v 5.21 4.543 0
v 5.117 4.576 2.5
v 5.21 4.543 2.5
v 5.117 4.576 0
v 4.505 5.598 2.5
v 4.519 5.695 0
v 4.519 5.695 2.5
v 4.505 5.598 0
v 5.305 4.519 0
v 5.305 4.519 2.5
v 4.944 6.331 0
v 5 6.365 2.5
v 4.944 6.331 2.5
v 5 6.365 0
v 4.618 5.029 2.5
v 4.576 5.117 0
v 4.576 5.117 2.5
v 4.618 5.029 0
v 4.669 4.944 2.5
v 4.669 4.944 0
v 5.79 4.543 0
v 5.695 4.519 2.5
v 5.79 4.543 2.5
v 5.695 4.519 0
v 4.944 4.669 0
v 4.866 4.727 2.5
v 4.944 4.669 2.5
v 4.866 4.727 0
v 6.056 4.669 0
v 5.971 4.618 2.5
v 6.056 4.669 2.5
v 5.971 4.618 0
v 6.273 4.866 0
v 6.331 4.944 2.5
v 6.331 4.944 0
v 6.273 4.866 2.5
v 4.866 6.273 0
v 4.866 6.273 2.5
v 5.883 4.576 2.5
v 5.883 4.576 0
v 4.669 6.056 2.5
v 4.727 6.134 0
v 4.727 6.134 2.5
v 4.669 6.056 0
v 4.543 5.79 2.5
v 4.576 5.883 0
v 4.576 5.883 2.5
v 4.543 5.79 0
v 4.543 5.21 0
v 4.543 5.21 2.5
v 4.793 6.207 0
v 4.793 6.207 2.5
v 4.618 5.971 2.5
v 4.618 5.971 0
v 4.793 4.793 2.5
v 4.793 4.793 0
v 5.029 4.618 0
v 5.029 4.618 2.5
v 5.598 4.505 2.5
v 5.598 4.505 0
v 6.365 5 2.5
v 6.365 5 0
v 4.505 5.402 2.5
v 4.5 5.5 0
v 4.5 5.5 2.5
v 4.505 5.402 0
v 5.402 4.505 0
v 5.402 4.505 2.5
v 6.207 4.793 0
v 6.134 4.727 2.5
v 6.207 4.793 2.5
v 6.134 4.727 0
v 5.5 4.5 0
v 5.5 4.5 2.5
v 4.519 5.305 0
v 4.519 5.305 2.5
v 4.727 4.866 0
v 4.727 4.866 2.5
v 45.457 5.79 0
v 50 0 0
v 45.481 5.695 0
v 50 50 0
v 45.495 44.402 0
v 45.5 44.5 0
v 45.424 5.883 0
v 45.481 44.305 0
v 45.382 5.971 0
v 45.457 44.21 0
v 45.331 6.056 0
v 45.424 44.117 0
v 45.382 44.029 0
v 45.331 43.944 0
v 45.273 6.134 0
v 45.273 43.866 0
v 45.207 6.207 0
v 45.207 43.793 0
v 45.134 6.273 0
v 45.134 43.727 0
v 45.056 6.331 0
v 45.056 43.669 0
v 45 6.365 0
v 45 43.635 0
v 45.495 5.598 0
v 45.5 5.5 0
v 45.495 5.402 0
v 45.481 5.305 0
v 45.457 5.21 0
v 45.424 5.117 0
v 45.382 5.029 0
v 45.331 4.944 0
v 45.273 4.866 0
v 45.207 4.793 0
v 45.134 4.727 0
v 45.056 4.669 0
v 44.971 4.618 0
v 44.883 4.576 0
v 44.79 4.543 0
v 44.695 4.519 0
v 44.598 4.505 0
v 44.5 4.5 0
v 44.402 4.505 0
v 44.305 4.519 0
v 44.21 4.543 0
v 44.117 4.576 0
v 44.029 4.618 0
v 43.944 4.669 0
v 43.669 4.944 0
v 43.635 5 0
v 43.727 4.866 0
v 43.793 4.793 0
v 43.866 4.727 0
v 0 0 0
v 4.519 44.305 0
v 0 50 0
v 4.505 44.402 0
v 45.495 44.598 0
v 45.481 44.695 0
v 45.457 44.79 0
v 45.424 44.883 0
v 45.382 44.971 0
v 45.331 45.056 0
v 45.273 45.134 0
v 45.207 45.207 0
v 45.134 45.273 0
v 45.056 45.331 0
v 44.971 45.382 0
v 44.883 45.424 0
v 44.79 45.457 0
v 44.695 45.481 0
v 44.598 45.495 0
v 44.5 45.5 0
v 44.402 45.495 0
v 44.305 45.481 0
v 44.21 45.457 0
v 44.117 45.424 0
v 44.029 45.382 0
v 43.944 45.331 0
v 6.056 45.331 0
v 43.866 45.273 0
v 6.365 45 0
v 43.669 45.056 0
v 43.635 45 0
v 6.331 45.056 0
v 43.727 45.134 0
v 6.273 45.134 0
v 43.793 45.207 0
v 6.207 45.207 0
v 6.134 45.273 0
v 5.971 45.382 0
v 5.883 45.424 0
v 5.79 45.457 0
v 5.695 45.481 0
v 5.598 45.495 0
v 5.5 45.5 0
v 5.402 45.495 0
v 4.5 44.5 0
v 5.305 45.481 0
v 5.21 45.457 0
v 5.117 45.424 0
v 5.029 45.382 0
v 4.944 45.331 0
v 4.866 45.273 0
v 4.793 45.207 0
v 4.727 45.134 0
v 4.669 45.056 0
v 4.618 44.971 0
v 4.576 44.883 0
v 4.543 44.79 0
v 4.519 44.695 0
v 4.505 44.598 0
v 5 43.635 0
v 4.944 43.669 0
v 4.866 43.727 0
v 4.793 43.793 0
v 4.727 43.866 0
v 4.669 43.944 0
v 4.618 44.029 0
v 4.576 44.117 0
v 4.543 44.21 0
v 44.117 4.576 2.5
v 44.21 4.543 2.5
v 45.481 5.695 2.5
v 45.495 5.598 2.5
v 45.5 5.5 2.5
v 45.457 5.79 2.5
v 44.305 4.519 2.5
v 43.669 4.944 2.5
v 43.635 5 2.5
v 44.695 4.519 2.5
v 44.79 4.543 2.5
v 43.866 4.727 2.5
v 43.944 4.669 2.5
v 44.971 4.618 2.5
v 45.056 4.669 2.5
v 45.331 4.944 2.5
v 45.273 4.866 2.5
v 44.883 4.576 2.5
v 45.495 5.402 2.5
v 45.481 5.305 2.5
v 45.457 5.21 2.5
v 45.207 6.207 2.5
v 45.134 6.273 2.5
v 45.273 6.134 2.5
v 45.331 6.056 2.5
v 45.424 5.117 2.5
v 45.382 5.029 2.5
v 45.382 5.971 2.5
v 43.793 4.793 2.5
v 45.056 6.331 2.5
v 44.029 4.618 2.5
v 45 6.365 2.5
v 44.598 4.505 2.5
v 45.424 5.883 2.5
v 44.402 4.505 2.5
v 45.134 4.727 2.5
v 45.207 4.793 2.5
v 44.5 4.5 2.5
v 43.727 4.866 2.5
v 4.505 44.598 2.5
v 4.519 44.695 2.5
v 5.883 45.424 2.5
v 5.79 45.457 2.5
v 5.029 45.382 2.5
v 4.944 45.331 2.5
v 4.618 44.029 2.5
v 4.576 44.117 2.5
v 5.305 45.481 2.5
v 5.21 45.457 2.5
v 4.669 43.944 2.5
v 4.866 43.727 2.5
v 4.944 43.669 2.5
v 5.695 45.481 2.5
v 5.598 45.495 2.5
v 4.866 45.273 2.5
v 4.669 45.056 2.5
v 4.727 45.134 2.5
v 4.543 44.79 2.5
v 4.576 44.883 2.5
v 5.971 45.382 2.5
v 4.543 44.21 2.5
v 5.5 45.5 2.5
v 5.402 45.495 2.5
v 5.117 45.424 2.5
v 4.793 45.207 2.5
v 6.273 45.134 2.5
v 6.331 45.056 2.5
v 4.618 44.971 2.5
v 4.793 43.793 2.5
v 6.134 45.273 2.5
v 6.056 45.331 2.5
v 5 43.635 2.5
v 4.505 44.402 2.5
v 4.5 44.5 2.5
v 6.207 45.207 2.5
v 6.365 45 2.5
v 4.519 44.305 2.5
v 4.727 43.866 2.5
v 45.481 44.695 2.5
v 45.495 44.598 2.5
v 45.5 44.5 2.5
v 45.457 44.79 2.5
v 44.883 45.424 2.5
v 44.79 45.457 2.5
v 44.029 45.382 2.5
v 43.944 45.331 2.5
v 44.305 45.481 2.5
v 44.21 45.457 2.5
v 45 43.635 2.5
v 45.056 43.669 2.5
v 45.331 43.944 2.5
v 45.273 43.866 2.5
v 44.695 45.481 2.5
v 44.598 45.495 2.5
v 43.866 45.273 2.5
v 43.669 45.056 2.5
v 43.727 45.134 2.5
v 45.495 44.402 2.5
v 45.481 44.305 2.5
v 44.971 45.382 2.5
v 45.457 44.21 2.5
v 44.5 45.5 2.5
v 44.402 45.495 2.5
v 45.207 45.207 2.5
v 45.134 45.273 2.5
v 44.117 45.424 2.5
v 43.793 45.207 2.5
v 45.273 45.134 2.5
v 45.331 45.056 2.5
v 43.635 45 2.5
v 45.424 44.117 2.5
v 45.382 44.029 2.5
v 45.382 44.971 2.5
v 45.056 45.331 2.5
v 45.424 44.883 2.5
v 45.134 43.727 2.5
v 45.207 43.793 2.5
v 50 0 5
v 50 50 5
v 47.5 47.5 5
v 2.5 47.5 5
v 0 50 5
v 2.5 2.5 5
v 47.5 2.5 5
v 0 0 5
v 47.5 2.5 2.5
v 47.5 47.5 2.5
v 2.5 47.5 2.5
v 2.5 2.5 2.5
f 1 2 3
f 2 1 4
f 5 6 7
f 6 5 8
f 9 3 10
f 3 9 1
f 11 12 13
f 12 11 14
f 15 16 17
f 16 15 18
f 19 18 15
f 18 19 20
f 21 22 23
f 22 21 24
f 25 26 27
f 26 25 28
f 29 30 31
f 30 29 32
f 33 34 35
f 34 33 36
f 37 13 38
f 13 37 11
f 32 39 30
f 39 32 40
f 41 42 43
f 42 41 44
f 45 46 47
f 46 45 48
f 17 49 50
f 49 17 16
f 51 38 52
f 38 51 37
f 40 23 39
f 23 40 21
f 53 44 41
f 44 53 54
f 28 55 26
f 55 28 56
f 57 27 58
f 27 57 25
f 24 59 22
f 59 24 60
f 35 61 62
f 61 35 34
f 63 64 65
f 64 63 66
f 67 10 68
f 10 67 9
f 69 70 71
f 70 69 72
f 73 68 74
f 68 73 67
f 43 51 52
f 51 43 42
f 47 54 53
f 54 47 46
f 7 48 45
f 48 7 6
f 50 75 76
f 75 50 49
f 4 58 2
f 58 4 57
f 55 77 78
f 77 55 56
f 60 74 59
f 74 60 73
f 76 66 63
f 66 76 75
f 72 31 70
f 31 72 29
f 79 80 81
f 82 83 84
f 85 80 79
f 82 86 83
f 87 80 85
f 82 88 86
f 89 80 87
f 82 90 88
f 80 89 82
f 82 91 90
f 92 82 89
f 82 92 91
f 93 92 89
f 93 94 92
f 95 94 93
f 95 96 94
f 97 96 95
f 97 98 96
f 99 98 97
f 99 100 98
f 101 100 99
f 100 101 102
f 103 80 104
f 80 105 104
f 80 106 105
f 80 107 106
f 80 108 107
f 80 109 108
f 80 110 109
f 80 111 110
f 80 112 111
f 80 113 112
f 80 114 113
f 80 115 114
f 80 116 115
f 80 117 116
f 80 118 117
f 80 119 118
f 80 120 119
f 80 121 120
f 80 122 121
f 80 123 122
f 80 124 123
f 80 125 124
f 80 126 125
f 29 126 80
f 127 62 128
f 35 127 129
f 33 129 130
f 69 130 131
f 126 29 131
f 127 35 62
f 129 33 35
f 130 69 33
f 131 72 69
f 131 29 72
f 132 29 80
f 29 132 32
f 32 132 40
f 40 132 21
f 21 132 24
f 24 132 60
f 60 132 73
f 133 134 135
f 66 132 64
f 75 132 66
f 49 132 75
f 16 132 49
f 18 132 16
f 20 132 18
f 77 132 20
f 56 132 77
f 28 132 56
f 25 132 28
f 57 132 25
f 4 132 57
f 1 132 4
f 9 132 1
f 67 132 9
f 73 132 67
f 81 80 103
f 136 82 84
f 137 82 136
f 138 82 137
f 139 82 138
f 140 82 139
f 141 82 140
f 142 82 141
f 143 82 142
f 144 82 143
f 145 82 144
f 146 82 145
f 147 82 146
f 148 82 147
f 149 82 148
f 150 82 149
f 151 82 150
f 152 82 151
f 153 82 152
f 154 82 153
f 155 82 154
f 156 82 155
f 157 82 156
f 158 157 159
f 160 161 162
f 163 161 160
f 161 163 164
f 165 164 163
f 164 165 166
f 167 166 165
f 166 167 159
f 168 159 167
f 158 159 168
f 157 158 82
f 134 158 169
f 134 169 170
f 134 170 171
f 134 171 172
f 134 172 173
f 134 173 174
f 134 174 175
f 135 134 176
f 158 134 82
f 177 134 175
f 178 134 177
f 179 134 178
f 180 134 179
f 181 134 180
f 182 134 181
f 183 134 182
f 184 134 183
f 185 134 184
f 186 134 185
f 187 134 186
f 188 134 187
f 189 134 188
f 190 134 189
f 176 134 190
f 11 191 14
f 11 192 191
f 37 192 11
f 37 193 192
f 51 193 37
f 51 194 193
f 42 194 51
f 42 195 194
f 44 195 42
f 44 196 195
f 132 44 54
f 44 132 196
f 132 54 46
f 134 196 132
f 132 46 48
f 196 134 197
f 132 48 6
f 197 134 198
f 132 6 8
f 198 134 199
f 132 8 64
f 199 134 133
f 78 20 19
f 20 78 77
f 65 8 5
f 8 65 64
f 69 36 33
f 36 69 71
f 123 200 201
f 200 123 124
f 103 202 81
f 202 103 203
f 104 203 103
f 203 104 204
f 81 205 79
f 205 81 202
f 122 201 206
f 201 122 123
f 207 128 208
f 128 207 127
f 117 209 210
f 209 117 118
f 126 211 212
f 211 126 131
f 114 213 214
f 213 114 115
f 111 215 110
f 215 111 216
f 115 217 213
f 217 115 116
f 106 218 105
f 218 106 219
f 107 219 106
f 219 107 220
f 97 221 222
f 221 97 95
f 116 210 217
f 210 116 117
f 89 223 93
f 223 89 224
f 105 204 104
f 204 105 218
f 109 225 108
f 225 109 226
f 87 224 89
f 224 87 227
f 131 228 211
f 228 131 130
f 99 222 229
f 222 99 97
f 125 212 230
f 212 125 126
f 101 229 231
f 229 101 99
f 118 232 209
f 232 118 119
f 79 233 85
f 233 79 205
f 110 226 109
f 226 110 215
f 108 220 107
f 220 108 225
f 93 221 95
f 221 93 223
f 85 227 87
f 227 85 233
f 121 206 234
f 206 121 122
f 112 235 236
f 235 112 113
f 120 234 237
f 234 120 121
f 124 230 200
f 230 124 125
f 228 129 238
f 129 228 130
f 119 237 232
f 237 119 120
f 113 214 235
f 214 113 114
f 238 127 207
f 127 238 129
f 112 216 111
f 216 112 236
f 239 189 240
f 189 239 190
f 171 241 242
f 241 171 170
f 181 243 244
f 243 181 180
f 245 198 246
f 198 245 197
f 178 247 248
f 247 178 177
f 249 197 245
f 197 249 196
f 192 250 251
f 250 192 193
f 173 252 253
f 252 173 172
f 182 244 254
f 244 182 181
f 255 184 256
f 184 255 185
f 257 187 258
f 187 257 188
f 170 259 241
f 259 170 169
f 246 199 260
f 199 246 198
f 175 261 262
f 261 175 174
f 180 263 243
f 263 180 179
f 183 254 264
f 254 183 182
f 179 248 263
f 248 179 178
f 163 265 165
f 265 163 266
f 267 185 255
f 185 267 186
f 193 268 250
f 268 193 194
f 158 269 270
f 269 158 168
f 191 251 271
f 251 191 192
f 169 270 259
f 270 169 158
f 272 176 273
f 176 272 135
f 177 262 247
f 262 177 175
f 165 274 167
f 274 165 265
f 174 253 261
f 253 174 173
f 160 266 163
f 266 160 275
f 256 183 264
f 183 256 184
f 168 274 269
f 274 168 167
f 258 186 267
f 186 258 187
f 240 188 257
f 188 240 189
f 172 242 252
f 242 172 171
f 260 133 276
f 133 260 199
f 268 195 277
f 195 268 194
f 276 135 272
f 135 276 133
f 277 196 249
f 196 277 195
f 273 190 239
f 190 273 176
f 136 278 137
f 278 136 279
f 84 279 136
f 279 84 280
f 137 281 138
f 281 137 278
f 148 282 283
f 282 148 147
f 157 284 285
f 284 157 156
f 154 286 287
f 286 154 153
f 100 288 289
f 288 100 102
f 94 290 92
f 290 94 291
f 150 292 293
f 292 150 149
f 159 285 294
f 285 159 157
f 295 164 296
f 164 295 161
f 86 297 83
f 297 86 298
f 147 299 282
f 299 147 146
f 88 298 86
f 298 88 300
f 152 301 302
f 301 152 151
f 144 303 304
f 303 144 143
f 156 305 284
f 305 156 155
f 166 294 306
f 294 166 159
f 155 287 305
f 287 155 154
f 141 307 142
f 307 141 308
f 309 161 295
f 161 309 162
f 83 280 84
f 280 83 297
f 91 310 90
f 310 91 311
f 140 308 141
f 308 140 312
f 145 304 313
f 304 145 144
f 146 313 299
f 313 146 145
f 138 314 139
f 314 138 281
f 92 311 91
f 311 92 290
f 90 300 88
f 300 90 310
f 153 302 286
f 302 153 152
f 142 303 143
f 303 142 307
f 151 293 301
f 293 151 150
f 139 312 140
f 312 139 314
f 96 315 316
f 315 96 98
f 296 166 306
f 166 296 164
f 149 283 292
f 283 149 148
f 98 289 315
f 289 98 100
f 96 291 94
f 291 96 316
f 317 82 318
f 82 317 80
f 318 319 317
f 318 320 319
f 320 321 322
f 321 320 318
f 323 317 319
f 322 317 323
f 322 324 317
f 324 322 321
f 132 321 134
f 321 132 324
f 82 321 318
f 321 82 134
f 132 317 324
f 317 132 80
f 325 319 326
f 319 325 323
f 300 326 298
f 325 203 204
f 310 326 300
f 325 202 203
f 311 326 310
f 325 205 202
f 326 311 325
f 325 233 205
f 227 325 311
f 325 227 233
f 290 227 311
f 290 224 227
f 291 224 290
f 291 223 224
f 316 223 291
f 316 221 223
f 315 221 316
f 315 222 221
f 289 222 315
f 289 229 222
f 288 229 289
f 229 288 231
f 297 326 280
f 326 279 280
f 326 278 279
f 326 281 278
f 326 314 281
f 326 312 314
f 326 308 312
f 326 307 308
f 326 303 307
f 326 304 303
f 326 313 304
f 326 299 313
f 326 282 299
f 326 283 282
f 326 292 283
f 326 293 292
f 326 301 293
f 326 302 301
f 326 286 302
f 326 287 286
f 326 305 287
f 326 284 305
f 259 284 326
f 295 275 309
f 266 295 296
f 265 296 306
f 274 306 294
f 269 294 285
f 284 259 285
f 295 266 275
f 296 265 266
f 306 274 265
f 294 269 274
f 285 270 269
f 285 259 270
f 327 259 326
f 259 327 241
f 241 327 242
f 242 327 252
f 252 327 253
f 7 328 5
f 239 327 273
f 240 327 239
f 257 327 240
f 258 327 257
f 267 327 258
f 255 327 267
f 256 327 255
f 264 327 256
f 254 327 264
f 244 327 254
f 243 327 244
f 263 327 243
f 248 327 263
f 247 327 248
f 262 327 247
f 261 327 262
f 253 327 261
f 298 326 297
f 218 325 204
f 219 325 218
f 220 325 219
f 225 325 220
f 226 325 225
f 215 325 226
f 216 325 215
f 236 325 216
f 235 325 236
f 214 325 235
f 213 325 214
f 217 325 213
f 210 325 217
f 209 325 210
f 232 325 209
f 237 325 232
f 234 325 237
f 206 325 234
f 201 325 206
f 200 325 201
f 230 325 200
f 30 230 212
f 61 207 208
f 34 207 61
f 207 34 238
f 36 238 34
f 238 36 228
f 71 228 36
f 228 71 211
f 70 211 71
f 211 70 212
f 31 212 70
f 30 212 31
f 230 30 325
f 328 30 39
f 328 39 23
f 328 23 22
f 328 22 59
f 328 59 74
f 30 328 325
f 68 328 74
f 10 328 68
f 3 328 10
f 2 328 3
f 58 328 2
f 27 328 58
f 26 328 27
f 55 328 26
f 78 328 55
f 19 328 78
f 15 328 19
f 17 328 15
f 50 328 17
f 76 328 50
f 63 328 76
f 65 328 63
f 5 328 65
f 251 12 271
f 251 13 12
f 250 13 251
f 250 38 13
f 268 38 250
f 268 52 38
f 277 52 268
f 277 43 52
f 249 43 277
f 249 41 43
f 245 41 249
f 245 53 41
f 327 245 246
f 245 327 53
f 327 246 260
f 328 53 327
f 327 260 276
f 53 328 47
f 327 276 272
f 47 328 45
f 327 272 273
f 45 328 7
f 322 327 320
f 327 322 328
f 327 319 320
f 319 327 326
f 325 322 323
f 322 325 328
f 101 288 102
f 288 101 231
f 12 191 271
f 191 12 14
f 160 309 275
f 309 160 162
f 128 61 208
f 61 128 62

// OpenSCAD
// stand for mayo and katsup
// to organize the fridge
// 01.10.2025 Sebastian Weigl
 
// set the fregment sizes
$fn = $preview ? 48 : 64;

// vars
border=2.5;

fir_box_width=50;
fir_box_depth=50;
fir_box_height=5;

sec_box_width=45;
sec_box_depth=45;
sec_box_height=2.5;

thi_box_width=40;
thi_box_depth=40;
thi_box_height=5;

rad1=5.5;
rad2=44.5;

// modules
module corner_radius(radius=1, height=5){
  translate([rad1,rad1,0])
    #cylinder(h=height, r=radius, center=false);
  translate([rad2,rad1,0])
    cylinder(h=height, r=radius, center=false);
  translate([rad1,rad2,0])
    cylinder(h=height, r=radius, center=false);
  translate([rad2,rad2,0])
    cylinder(h=height, r=radius, center=false);
}


// object
difference() {
cube([fir_box_width,fir_box_depth,fir_box_height],false);
translate([border,border,border])
cube([sec_box_width,sec_box_depth,sec_box_height],false);
translate([25,25,2.5])
#cube([thi_box_width,thi_box_depth,thi_box_height],true);
corner_radius();
}
